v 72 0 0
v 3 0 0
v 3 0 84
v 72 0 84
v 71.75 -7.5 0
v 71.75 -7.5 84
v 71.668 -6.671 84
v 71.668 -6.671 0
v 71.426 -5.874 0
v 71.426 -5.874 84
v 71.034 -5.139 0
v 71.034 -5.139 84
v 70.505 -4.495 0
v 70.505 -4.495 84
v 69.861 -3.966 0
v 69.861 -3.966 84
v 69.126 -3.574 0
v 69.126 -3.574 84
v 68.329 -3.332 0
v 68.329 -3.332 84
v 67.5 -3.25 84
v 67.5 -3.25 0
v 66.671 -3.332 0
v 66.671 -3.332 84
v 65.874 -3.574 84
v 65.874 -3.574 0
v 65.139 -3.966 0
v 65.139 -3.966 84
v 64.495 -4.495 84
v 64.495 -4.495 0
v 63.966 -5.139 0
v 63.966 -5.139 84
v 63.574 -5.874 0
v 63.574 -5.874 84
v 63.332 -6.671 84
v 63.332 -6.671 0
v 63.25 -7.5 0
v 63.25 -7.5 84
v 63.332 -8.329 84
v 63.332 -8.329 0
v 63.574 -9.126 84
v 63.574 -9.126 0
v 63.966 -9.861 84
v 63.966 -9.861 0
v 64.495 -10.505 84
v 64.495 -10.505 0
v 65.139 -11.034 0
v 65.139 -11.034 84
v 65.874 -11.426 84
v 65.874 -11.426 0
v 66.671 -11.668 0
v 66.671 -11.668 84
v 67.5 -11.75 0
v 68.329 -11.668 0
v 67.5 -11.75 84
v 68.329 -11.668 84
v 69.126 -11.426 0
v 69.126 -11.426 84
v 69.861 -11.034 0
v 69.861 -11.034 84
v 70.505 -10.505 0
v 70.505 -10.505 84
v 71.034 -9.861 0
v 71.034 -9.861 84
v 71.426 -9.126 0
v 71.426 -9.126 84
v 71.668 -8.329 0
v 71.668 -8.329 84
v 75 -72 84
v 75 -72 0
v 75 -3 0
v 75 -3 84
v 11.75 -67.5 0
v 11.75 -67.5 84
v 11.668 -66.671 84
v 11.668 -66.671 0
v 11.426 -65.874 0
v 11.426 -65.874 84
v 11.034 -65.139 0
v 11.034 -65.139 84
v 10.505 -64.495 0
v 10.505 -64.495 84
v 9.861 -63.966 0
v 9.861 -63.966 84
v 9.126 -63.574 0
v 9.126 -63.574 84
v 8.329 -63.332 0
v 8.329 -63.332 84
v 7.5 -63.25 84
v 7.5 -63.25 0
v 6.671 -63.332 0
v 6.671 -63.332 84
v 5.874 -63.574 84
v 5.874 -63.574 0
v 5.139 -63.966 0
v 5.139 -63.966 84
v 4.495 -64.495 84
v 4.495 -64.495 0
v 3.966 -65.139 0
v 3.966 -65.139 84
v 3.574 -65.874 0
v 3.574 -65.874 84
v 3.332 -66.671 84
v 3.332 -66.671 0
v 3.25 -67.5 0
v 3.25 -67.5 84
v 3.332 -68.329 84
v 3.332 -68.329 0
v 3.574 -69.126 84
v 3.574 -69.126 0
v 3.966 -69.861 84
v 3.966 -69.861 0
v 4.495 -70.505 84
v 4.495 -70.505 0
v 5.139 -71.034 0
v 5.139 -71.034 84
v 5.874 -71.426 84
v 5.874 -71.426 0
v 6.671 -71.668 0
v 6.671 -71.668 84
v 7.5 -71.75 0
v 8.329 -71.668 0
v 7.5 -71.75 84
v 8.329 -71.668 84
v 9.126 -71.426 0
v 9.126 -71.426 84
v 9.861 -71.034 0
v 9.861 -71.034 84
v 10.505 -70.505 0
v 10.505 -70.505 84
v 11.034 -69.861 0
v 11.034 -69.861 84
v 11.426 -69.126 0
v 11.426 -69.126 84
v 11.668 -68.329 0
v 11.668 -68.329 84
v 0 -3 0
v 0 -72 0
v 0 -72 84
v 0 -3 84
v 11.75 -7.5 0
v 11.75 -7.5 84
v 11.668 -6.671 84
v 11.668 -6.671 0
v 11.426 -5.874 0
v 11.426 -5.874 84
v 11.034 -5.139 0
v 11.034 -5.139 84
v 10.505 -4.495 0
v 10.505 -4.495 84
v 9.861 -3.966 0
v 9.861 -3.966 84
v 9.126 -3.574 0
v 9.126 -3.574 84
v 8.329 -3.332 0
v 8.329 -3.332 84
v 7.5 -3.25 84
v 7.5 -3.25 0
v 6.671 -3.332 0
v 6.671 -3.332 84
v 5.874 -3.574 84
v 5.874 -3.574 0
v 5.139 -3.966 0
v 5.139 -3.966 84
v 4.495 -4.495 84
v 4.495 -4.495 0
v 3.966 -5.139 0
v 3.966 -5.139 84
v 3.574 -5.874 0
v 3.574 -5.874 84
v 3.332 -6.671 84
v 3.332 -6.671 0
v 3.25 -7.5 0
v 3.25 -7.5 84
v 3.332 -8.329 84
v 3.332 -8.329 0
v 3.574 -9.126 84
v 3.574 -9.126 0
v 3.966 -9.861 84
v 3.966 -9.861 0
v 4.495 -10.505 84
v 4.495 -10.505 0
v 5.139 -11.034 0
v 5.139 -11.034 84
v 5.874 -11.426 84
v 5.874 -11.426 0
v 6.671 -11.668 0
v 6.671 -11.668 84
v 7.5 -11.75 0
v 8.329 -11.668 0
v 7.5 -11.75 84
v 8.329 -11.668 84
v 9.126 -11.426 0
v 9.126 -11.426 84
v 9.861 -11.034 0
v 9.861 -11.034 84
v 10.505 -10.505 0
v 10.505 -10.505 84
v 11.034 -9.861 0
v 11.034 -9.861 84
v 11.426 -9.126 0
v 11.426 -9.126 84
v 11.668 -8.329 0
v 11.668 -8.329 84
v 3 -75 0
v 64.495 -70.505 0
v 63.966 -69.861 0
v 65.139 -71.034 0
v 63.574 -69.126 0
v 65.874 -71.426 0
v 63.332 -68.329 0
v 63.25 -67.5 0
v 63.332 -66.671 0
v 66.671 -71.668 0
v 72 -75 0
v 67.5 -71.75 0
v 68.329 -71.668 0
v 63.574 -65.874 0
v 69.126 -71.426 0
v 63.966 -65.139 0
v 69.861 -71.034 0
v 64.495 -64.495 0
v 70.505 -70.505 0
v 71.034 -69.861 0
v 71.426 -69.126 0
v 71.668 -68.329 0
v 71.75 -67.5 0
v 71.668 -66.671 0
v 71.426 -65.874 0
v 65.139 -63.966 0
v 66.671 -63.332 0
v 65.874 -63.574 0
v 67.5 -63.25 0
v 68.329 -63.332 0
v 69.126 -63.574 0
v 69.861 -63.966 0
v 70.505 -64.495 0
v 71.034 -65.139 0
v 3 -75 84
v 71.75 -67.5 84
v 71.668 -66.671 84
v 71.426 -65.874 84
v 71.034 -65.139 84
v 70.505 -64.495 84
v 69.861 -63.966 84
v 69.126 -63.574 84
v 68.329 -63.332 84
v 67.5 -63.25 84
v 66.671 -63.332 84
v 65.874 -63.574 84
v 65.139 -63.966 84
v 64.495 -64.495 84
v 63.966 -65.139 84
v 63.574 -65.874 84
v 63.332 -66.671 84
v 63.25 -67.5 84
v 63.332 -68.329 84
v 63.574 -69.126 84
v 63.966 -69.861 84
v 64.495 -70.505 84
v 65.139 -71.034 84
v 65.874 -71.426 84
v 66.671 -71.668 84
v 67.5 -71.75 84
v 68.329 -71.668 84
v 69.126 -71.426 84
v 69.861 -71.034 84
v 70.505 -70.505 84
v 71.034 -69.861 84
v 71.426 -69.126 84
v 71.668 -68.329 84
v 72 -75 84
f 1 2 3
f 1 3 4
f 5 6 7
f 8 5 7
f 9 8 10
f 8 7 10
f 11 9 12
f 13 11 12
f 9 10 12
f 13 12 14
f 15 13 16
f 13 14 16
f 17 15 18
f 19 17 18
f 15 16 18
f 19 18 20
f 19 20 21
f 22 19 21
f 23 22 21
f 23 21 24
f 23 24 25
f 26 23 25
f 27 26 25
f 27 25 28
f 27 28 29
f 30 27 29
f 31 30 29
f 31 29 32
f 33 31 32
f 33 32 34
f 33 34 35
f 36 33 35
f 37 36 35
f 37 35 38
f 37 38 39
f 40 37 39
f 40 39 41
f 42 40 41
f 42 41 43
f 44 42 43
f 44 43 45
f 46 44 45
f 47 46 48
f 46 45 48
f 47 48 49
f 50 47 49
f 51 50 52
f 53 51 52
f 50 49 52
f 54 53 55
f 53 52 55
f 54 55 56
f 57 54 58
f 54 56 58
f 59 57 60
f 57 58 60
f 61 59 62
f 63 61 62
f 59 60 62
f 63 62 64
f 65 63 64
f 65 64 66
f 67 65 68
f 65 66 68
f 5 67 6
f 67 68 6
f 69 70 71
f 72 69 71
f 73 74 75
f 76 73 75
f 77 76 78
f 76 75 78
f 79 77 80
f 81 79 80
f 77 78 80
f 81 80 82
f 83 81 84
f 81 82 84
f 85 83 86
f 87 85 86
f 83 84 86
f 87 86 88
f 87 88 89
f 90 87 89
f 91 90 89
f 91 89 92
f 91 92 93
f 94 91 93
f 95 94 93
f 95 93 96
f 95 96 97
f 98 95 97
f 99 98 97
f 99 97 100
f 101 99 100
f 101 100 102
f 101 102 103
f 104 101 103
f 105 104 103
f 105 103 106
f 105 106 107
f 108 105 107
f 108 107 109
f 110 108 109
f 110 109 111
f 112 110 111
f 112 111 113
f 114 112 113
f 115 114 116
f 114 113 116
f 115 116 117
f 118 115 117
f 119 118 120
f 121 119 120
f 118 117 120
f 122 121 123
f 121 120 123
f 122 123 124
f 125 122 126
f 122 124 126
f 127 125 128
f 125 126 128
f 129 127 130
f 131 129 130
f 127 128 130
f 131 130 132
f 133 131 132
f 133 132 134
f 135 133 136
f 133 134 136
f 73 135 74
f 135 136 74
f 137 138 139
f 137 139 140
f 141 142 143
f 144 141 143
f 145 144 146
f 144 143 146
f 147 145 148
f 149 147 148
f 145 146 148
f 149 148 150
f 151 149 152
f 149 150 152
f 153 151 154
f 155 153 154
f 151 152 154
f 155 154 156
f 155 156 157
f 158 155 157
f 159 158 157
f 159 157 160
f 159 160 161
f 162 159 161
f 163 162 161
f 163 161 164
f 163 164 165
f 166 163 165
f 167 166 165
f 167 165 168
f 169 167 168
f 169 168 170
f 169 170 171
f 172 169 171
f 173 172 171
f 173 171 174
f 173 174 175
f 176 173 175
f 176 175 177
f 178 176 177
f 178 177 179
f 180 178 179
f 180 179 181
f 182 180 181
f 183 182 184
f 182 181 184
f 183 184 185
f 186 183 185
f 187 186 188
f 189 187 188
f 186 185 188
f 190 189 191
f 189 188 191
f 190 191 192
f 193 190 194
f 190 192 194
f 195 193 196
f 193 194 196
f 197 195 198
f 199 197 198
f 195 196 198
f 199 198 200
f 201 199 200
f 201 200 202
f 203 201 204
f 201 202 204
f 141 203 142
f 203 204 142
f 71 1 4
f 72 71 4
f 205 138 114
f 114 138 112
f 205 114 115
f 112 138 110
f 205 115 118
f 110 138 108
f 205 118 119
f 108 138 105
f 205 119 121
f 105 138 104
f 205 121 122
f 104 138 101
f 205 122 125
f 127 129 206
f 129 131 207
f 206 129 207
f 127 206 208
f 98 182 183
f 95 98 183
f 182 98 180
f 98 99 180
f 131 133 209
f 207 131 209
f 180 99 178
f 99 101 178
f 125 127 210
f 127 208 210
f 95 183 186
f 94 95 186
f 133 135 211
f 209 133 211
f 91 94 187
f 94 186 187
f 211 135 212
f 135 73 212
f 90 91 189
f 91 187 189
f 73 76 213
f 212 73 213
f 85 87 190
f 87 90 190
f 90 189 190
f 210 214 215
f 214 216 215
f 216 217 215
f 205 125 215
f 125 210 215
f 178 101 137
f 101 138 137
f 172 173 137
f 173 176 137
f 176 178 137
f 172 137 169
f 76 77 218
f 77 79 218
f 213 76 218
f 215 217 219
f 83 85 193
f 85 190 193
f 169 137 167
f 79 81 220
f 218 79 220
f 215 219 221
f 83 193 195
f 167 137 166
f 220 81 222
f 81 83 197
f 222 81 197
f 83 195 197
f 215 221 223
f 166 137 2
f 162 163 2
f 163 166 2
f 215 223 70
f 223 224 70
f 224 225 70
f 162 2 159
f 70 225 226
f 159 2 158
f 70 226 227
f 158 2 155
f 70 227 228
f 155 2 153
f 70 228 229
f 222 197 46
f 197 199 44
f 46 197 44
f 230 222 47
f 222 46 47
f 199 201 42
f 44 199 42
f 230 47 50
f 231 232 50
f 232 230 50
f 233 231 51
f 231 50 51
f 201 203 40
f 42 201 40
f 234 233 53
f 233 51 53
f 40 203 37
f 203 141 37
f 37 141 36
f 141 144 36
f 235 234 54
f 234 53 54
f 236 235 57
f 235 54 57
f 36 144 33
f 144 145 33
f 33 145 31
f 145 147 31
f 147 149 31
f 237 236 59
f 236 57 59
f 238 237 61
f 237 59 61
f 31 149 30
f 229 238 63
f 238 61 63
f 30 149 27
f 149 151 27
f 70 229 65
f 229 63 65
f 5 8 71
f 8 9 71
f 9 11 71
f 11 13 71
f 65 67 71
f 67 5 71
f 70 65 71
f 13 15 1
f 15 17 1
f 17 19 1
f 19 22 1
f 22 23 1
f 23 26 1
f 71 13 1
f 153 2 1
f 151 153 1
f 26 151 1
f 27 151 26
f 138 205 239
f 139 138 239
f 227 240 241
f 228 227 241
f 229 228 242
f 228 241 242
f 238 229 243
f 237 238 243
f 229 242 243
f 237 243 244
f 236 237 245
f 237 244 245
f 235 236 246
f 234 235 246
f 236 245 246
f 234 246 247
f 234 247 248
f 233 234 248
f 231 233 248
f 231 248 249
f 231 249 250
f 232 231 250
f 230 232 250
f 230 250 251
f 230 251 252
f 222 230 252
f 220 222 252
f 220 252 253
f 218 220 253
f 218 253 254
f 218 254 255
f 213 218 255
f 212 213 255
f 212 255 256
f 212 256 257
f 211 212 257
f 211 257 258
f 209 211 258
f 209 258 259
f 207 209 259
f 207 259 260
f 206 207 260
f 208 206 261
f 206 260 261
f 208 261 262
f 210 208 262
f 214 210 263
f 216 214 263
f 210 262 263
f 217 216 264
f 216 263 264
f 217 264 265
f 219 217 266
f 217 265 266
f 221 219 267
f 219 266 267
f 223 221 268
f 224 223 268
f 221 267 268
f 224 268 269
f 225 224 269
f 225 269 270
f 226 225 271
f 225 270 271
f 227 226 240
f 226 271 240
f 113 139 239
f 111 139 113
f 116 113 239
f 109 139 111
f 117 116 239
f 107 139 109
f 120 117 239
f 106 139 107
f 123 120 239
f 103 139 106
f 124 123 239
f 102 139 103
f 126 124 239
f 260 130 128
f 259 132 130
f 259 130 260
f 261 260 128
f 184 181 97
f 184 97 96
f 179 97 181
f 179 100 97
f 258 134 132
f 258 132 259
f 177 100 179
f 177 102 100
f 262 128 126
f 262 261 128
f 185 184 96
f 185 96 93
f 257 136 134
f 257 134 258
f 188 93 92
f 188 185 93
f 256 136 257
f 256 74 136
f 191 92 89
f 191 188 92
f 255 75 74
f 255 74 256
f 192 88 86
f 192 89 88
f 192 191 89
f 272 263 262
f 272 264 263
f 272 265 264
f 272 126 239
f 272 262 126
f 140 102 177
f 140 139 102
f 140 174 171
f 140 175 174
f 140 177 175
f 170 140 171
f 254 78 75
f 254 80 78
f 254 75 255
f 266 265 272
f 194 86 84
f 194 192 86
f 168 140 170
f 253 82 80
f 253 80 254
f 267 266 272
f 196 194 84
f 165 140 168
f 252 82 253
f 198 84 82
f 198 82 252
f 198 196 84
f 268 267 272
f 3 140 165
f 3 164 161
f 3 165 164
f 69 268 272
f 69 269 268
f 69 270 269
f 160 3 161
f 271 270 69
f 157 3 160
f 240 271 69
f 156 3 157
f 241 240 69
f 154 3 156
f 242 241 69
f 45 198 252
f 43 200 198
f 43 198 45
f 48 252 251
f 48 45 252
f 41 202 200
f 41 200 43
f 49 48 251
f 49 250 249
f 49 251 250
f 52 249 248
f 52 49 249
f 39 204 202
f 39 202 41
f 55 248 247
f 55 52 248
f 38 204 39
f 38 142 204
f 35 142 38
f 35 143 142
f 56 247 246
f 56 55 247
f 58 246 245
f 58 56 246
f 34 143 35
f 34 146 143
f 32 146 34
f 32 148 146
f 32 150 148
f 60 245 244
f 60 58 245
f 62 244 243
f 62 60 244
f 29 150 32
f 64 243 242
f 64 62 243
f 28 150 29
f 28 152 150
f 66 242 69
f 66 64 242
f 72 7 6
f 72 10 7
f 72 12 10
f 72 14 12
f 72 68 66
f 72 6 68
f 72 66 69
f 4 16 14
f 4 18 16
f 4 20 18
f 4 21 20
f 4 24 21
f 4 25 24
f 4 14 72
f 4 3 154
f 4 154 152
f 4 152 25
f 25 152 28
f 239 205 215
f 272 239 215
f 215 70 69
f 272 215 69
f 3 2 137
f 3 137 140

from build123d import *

# Parameters (mm, degrees)
SKETCH_1_W          = 75
SKETCH_1_H          = 75
EXTRUDE_1_DEPTH     = 84
CHAMFER_1_SIZE      = 3
SKETCH_2_R          = 4.25
CUT_EXTRUDE_1_DEPTH = 85


with BuildPart() as part:
    # 草图1 → 凸台-拉伸1 (new body)
    with BuildSketch(Plane.XY):
        with Locations((37.5, -37.5)):
            Rectangle(SKETCH_1_W, SKETCH_1_H)
    extrude(amount=EXTRUDE_1_DEPTH)

    # 倒角1
    chamfer_1_edges = [part.edges().sort_by_distance(p)[0] for p in [
        (0, 0, 42),
        (75, 0, 42),
        (75, -75, 42),
        (0, -75, 42),
    ]]
    chamfer(chamfer_1_edges, length=CHAMFER_1_SIZE)

    # 草图2 → 切除-拉伸1 (cut, through all)
    with BuildSketch(Plane.XY.offset(84)):
        with Locations((7.5, -7.5)):
            Circle(SKETCH_2_R)
        with Locations((67.5, -7.5)):
            Circle(SKETCH_2_R)
        with Locations((67.5, -67.5)):
            Circle(SKETCH_2_R)
        with Locations((7.5, -67.5)):
            Circle(SKETCH_2_R)
    extrude(amount=-CUT_EXTRUDE_1_DEPTH, mode=Mode.SUBTRACT)


solid = part.part
